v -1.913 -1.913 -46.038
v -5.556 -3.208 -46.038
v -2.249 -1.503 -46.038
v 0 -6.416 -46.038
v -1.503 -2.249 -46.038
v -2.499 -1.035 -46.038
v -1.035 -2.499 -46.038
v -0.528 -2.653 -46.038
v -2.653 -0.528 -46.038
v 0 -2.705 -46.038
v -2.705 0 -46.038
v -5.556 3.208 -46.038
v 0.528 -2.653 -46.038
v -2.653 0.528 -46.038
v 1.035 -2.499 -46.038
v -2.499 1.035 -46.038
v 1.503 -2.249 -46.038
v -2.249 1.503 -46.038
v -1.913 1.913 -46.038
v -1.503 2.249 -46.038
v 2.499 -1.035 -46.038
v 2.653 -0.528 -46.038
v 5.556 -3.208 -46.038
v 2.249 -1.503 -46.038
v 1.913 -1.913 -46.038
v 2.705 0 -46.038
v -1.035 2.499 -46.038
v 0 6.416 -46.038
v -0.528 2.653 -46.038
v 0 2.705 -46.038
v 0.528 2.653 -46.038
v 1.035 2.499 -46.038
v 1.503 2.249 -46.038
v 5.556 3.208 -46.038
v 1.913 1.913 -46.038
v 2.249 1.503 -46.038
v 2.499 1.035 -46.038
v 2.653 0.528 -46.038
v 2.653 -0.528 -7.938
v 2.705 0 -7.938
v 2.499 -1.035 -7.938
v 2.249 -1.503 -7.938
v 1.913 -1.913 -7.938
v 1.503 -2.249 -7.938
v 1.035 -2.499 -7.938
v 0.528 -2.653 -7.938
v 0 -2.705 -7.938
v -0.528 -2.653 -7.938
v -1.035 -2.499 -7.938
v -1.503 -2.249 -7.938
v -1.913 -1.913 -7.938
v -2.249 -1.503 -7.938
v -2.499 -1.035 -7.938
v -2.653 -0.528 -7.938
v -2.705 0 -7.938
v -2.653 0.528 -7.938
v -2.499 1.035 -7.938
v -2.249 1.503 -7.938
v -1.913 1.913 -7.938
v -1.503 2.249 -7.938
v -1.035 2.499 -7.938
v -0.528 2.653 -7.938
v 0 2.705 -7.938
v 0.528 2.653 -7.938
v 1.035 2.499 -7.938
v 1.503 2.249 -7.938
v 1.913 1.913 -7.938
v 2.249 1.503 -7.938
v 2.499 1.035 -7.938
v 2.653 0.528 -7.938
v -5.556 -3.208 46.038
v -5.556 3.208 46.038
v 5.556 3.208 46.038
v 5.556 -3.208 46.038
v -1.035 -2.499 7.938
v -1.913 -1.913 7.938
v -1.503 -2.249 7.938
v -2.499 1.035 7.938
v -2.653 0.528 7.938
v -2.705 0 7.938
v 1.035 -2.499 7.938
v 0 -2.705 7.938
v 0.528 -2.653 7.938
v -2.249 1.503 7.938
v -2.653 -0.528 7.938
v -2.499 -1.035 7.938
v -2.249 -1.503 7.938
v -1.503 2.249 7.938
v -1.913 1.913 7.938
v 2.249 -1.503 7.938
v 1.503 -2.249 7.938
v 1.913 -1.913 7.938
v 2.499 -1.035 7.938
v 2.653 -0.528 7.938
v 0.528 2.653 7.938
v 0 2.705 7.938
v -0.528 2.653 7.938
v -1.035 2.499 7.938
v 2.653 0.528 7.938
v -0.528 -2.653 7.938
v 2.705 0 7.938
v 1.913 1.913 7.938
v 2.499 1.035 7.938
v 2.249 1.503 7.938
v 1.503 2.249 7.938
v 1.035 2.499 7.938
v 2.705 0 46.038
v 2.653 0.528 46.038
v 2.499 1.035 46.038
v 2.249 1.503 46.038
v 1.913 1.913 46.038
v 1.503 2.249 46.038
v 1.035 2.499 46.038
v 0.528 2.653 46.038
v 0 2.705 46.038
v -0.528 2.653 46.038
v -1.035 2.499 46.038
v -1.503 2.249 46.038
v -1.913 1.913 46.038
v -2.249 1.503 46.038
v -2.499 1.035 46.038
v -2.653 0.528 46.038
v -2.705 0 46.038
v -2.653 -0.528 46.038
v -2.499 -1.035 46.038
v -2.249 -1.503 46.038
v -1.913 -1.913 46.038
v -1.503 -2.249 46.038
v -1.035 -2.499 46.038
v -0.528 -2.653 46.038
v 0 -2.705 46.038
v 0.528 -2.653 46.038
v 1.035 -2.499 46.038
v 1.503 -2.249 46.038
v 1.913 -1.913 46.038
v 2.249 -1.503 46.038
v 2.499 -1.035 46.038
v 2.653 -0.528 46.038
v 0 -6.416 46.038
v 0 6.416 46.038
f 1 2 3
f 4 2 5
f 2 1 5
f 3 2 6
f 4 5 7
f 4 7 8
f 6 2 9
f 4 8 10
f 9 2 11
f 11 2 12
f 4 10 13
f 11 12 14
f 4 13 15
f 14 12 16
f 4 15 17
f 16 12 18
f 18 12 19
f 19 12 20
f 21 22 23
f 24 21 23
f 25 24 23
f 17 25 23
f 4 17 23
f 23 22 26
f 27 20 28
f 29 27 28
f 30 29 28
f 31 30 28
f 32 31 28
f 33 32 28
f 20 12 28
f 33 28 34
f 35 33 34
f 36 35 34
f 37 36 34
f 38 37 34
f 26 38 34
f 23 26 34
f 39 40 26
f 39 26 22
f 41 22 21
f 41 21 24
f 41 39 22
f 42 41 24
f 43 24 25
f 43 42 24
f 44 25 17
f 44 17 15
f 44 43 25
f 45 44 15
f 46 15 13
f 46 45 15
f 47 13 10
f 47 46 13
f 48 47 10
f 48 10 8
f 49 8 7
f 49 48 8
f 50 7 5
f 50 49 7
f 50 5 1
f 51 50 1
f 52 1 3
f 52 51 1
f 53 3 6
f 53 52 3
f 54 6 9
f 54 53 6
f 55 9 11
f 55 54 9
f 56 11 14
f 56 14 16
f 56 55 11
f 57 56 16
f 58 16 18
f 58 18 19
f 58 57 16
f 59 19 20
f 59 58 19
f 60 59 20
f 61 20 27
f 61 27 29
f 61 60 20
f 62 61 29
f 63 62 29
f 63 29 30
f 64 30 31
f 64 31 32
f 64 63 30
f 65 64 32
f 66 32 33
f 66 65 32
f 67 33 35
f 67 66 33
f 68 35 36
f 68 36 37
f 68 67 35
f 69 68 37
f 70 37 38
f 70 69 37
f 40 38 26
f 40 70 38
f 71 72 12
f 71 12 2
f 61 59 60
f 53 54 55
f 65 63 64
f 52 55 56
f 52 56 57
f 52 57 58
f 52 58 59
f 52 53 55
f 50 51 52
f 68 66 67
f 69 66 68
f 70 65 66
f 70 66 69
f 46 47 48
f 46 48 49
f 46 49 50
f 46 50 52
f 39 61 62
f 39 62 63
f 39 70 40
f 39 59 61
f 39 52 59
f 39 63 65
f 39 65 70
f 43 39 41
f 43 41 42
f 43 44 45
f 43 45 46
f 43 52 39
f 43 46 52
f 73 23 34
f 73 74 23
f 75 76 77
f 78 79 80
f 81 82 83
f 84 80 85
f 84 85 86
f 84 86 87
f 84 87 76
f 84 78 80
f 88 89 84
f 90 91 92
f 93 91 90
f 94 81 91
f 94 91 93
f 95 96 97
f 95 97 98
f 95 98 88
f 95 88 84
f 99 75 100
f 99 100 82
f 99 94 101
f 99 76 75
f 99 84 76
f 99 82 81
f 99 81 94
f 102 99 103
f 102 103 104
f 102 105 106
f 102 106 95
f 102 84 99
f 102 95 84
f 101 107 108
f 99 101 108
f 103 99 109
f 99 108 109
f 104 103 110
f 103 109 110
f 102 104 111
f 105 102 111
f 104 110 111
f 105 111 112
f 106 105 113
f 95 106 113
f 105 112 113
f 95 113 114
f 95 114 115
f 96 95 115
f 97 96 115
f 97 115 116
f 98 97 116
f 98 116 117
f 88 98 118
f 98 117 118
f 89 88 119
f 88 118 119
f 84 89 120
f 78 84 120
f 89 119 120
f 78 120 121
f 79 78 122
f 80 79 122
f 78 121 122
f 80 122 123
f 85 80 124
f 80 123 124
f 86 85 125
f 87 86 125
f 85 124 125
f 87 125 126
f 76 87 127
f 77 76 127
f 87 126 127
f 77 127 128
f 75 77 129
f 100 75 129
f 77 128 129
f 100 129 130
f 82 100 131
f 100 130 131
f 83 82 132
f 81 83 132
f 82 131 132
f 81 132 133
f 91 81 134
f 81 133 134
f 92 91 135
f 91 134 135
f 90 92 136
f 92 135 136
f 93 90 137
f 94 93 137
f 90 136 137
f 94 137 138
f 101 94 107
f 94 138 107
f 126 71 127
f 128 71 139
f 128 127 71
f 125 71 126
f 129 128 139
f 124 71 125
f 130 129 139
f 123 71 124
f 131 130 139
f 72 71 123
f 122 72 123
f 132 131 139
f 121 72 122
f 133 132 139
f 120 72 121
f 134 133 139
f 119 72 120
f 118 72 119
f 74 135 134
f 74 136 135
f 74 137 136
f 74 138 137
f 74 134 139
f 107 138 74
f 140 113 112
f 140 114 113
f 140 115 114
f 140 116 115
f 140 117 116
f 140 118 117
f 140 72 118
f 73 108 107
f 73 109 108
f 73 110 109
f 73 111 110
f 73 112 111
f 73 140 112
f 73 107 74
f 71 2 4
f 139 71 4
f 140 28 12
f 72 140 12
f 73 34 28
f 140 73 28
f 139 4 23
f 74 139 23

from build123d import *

# Parameters (mm, degrees)
BOSS_EXTRUDE1_DEPTH = 46.0375
SKETCH3_R           = 2.7051
CUT_EXTRUDE1_DEPTH  = 38.1
CUT_EXTRUDE2_START  = -38.1
SKETCH4_R           = 2.7051
CUT_EXTRUDE2_DEPTH  = 38.1


with BuildPart() as part:
    # Sketch2 → Boss-Extrude1 (new, symmetric)
    with BuildSketch(Plane.XY):
        Polygon((0, 6.415804866), (-5.55625, 3.207902433), (-5.55625, -3.207902433), (0, -6.415804866), (5.55625, -3.207902433), (5.55625, 3.207902433), align=None)
    extrude(amount=BOSS_EXTRUDE1_DEPTH, both=True)

    # Sketch3 → Cut-Extrude1 (cut)
    with BuildSketch(Plane.XY.offset(46.0375)):
        Circle(SKETCH3_R)
    extrude(amount=-CUT_EXTRUDE1_DEPTH, mode=Mode.SUBTRACT)

    # Sketch4 → Cut-Extrude2 (cut)
    with BuildSketch(Plane(origin=(0, 0, -46.0375), x_dir=(-1, 0, 0), z_dir=(0, 0, -1)).offset(CUT_EXTRUDE2_START)):
        with Locations(Location((0, 0, 0), (0, 0, 180))):
            Circle(SKETCH4_R)
    extrude(amount=CUT_EXTRUDE2_DEPTH, mode=Mode.SUBTRACT)


solid = part.part
